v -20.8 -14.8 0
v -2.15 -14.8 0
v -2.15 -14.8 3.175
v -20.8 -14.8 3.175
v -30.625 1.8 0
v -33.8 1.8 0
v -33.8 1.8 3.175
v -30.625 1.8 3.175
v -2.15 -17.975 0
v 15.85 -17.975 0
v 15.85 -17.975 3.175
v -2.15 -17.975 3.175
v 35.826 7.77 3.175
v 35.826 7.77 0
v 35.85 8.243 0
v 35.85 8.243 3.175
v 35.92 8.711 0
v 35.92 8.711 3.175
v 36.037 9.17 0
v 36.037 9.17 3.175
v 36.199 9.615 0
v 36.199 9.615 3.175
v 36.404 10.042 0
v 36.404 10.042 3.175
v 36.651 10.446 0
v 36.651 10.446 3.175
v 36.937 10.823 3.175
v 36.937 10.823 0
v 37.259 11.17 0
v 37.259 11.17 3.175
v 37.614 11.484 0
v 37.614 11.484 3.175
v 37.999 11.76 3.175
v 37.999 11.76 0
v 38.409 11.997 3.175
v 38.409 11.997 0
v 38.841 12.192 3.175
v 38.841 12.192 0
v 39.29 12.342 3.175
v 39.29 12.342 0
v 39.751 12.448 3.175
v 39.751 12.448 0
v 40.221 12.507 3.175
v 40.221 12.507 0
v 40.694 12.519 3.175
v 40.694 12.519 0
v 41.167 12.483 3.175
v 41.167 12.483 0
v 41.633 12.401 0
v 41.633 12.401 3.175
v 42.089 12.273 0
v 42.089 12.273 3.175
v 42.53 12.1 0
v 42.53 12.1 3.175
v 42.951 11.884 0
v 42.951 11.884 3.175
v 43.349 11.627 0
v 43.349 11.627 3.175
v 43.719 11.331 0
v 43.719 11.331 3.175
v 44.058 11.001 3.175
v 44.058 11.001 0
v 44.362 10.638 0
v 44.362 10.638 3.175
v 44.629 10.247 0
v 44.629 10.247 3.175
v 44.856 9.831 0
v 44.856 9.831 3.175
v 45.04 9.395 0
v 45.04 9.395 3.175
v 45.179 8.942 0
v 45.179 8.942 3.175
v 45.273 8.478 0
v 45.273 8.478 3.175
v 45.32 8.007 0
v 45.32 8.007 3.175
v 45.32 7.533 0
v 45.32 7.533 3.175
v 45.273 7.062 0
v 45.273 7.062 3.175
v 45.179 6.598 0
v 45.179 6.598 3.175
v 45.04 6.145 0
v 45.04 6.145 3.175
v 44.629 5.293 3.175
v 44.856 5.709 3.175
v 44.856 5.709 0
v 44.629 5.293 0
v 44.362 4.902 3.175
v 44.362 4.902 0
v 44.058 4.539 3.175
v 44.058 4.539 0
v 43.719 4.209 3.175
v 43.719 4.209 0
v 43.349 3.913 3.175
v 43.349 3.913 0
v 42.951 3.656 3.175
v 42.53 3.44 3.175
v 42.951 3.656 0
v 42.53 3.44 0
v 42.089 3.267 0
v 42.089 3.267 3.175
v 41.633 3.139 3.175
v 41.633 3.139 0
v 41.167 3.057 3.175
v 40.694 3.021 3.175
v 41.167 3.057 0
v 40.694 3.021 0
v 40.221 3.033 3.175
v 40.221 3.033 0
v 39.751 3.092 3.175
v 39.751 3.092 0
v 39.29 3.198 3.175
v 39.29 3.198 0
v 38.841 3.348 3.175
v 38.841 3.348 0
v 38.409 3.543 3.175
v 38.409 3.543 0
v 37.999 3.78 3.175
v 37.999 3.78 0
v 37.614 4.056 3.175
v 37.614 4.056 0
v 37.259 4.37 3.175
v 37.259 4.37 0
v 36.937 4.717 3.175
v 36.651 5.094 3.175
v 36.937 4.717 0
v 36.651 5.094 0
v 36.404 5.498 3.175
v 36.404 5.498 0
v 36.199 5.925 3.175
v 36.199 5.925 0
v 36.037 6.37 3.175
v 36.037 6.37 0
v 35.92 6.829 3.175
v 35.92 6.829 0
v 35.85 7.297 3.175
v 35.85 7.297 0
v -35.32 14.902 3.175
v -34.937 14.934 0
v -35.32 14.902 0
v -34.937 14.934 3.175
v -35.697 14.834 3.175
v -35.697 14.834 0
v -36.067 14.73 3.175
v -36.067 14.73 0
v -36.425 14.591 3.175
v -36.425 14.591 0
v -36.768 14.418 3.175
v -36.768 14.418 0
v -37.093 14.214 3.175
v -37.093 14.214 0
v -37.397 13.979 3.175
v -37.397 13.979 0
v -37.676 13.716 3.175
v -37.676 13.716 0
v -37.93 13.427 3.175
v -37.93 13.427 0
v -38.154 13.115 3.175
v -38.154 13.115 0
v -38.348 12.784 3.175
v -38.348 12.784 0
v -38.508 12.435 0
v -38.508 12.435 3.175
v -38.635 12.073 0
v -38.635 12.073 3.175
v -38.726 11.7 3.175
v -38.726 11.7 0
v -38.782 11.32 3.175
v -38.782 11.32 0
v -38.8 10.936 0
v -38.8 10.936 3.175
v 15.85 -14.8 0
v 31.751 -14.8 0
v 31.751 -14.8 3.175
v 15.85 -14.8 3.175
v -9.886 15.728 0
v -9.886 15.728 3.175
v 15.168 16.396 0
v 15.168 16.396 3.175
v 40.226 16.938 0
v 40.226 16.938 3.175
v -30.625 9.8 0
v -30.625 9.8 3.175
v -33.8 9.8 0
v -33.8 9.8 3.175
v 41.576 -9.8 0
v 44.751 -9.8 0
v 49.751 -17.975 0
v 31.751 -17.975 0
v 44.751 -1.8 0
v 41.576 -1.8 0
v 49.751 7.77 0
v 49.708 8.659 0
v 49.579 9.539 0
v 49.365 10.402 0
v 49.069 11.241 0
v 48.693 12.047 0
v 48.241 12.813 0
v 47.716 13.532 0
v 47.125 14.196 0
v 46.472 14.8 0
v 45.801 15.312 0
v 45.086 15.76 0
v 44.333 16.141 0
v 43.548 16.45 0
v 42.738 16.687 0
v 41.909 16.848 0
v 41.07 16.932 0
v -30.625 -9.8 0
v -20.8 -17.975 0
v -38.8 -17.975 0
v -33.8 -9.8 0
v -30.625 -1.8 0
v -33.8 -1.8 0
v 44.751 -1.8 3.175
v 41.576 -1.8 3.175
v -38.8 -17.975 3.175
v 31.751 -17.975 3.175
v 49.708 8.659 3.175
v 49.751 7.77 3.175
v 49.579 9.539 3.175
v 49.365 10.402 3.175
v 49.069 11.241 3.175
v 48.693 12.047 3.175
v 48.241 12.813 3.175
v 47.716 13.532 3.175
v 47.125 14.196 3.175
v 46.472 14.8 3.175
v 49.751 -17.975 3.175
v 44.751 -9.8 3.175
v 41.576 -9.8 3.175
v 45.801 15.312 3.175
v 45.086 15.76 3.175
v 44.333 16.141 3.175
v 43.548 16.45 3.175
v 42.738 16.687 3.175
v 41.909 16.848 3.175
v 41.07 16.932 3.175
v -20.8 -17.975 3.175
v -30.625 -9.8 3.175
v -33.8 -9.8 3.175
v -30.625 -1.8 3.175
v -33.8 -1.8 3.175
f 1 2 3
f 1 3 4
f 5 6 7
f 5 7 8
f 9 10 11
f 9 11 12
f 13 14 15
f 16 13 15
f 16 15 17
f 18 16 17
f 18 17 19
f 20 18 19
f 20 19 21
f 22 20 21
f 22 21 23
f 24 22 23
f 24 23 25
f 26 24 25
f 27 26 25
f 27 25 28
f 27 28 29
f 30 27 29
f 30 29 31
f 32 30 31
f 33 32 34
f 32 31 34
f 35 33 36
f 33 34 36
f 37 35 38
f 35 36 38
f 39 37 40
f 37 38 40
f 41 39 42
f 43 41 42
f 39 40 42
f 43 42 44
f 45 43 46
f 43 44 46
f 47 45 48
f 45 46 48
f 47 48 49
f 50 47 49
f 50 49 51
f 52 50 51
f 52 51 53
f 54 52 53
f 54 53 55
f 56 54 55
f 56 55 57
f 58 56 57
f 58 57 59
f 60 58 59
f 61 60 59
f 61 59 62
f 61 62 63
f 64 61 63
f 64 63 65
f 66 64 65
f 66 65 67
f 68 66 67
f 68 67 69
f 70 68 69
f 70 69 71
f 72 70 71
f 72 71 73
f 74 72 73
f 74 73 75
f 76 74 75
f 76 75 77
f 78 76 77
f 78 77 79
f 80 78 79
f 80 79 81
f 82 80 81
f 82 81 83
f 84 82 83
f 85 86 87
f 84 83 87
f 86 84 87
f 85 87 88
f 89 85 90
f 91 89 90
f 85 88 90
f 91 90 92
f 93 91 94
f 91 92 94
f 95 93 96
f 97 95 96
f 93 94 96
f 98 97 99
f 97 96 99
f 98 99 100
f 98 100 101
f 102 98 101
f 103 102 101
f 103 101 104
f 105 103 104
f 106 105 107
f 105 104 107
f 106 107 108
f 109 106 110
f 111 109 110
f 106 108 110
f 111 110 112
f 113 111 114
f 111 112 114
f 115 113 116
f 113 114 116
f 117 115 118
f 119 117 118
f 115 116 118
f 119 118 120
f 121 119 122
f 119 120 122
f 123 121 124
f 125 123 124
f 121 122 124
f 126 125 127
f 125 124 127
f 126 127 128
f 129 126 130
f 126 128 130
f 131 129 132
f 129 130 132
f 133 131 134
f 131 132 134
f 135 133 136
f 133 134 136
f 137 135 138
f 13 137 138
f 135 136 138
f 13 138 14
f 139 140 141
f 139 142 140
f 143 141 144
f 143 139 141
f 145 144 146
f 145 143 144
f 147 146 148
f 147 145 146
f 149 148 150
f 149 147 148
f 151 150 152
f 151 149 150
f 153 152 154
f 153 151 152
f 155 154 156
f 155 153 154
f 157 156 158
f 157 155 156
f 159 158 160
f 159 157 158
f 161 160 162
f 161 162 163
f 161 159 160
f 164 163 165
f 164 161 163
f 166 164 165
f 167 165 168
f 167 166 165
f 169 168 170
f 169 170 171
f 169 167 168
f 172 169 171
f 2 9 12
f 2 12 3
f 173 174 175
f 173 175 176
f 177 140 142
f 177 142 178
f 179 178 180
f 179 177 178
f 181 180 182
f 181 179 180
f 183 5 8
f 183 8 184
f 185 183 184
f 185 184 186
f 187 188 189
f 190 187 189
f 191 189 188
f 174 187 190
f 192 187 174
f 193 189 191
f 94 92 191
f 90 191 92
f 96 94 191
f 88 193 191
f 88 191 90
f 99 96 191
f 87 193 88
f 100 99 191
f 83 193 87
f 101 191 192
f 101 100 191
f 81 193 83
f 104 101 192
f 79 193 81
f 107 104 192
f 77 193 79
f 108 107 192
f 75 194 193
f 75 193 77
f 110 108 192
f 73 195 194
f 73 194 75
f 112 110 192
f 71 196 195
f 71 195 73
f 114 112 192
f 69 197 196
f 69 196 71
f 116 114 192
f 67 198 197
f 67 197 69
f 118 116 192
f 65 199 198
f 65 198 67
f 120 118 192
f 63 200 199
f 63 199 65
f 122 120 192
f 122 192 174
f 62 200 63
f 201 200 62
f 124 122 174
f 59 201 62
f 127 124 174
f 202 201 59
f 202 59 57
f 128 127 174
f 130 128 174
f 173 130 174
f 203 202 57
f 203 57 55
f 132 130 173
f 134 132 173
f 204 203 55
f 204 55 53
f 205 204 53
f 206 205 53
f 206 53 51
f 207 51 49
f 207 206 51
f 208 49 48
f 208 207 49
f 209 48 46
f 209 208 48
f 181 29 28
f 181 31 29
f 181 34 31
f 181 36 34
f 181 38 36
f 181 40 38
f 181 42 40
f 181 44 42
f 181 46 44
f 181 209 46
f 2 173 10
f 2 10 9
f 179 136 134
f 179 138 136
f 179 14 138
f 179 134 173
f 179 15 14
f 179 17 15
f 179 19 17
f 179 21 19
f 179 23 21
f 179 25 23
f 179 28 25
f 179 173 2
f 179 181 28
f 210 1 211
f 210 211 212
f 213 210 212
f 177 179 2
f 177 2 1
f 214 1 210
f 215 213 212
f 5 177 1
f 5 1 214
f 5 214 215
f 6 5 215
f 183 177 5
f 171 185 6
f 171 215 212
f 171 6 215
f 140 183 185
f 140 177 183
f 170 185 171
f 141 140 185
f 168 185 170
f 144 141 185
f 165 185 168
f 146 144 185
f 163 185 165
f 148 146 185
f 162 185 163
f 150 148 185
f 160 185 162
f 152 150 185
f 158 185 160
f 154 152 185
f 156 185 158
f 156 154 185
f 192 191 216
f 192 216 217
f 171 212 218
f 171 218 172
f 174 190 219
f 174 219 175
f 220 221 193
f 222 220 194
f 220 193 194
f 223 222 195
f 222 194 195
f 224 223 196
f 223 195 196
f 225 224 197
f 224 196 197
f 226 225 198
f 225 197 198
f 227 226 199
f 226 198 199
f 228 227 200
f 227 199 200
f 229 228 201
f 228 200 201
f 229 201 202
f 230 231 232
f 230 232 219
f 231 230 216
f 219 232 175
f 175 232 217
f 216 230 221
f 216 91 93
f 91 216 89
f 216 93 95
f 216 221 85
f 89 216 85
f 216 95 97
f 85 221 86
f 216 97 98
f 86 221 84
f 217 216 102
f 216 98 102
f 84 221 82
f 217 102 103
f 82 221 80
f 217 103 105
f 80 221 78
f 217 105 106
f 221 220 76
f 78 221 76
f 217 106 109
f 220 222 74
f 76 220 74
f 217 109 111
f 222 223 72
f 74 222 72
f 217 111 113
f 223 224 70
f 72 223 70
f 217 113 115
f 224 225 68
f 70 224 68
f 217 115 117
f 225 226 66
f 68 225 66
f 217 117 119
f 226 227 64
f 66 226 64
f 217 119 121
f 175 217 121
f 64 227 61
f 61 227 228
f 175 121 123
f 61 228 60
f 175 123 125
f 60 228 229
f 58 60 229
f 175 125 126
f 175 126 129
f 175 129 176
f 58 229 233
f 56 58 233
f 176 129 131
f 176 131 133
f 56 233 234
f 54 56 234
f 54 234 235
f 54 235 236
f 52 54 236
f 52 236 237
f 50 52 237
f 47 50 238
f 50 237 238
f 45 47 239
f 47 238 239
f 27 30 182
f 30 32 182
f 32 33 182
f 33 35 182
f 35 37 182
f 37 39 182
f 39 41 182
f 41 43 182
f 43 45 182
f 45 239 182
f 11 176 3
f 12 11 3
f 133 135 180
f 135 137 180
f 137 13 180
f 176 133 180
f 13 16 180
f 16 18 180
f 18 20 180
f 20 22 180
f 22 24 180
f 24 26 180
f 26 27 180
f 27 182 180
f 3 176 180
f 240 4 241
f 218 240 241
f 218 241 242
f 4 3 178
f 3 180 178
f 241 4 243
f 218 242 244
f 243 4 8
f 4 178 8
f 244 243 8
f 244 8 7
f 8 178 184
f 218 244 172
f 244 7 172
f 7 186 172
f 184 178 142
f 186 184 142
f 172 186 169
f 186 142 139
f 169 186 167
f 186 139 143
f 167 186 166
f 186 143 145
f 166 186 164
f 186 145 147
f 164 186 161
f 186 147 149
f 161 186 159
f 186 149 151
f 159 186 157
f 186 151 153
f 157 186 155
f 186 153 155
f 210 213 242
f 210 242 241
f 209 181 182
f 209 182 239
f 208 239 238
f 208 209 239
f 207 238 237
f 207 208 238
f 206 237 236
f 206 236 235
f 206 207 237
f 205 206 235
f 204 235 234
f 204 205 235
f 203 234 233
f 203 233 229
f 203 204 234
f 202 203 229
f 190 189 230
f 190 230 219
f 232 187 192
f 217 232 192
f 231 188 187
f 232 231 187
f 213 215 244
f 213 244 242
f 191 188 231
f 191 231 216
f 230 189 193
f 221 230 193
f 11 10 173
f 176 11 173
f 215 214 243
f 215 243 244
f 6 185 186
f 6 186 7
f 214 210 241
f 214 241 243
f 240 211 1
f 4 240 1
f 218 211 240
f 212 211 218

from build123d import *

# Parameters (mm, degrees)
SKETCH1_W            = 6.266
SKETCH1_H            = 19.6
SKETCH1_R            = 1.675
SKETCH1_W_2          = 52.832
SKETCH1_H_2          = 5
BOSS_EXTRUDE2_DEPTH  = 3.175
SKETCH3_W            = 30
SKETCH3_H            = 29.6
BOSS_EXTRUDE3_DEPTH  = 3.175
SKETCH4_R            = 4.75
CUT_EXTRUDE1_DEPTH   = 10
BOSS_EXTRUDE14_DEPTH = 3.175
CUT_EXTRUDE8_DEPTH   = 10
BOSS_EXTRUDE15_DEPTH = 3.175
BOSS_EXTRUDE16_DEPTH = 3.175
BOSS_EXTRUDE17_DEPTH = 3.175
FILLET5_R            = 4
SKETCH27_W           = 3.175
SKETCH27_H           = 8
CUT_EXTRUDE9_DEPTH   = 10
SKETCH28_W           = 18
SKETCH28_H           = 3.175
BOSS_EXTRUDE18_DEPTH = 3.175
SKETCH29_W           = 53.813797415
SKETCH29_H           = 23.475817665
BOSS_EXTRUDE19_DEPTH = 3.175


with BuildPart() as part:
    # Sketch1 → Boss-Extrude2 (new body)
    # profile 1 of 4: a face of its own
    with BuildSketch(Plane.XY):
        with Locations((-23.283, 0)):
            Rectangle(SKETCH1_W, SKETCH1_H)
        with Locations((-23.95, -4.974)):
            Circle(SKETCH1_R, mode=Mode.SUBTRACT)
        with Locations((-23.95, 4.974)):
            Circle(SKETCH1_R, mode=Mode.SUBTRACT)
    # profile 2 of 4: a face of its own
    with BuildSketch(Plane.XY):
        with Locations((23.283, 0)):
            Rectangle(SKETCH1_W, SKETCH1_H)
        with Locations((23.95, -4.974)):
            Circle(SKETCH1_R, mode=Mode.SUBTRACT)
        with Locations((23.95, 4.974)):
            Circle(SKETCH1_R, mode=Mode.SUBTRACT)
    # profile 3 of 4: a face of its own
    with BuildSketch(Plane.XY):
        with Locations((0, 12.3)):
            Rectangle(SKETCH1_W_2, SKETCH1_H_2)
    # profile 4 of 4: a face of its own
    with BuildSketch(Plane.XY):
        with Locations((0, -12.3)):
            Rectangle(SKETCH1_W_2, SKETCH1_H_2)
    extrude(amount=BOSS_EXTRUDE2_DEPTH)

    # Sketch3 → Boss-Extrude3 (add)
    with BuildSketch(Plane.XY.offset(3.175)):
        with Locations((41.416, 0)):
            Rectangle(SKETCH3_W, SKETCH3_H)
    extrude(amount=-BOSS_EXTRUDE3_DEPTH)

    # Sketch4 → Cut-Extrude1 (cut)
    with BuildSketch(Plane(origin=(0, 0, 0), x_dir=(-1, 0, 0), z_dir=(0, 0, -1))):
        with Locations((-40.576, 7.77)):
            Circle(SKETCH4_R)
    extrude(amount=-CUT_EXTRUDE1_DEPTH, mode=Mode.SUBTRACT)

    # Sketch22 → Boss-Extrude14 (add)
    with BuildSketch(Plane(origin=(0, 0, 0), x_dir=(-1, 0, 0), z_dir=(0, 0, -1))):
        with BuildLine():
            ThreePointArc((-34.680262133, 14.8), (-40.576, 16.945), (-46.471737867, 14.8))
            Line((-46.471737867, 14.8), (-34.680262133, 14.8))
        make_face()
    extrude(amount=-BOSS_EXTRUDE14_DEPTH)

    # Sketch23 → Cut-Extrude8 (cut)
    with BuildSketch(Plane(origin=(0, 0, 0), x_dir=(-1, 0, 0), z_dir=(0, 0, -1))):
        with BuildLine():
            Line((-49.751, -14.8), (-49.751, 7.77))
            ThreePointArc((-49.751, 7.77), (-48.890866804, 11.648609936), (-46.471737867, 14.8))
            Line((-46.471737867, 14.8), (-56.416, 14.8))
            Line((-56.416, 14.8), (-56.416, -14.8))
            Line((-56.416, -14.8), (-49.751, -14.8))
        make_face()
    extrude(amount=-CUT_EXTRUDE8_DEPTH, mode=Mode.SUBTRACT)

    # Sketch24 → Boss-Extrude15 (add)
    with BuildSketch(Plane(origin=(0, 0, 0), x_dir=(-1, 0, 0), z_dir=(0, 0, -1))):
        Polygon((30.625, 14.8), (26.416, 14.8), (26.416, -14.8), (27.751006616, -14.8), (30.625, -14.8), align=None)
    extrude(amount=-BOSS_EXTRUDE15_DEPTH)

    # Sketch25 → Boss-Extrude16 (add)
    with BuildSketch(Plane(origin=(0, 0, 0), x_dir=(-1, 0, 0), z_dir=(0, 0, -1))):
        Polygon((30.625, 14.8), (30.625, 9.8), (33.8, 9.8), (33.8, 1.8), (30.625, 1.8), (30.625, -1.8), (33.8, -1.8), (33.8, -9.8), (30.625, -9.8), (30.625, -14.8), (31.879074074, -14.8), (38.8, -14.8), (38.8, 14.8), align=None)
    extrude(amount=-BOSS_EXTRUDE16_DEPTH)

    # Sketch26 → Boss-Extrude17 (add)
    with BuildSketch(Plane(origin=(0, 0, 0), x_dir=(-1, 0, 0), z_dir=(0, 0, -1))):
        with BuildLine():
            ThreePointArc((-40.225848077, 16.938316019), (-37.275108655, 16.330650754), (-34.680262133, 14.8))
            Line((-34.680262133, 14.8), (38.8, 14.8))
            ThreePointArc((38.8, 14.8), (-0.708684686, 16.025831975), (-40.225848077, 16.938316019))
        make_face()
    extrude(amount=-BOSS_EXTRUDE17_DEPTH)

    # Fillet5
    fillet5_edges = [part.edges().sort_by_distance(p)[0] for p in [
        (-38.8, 14.8, 1.5875),
    ]]
    fillet(fillet5_edges, radius=FILLET5_R)

    # Sketch27 → Cut-Extrude9 (cut)
    with BuildSketch(Plane(origin=(0, 0, 0), x_dir=(-1, 0, 0), z_dir=(0, 0, -1))):
        with Locations((-43.1635, -5.8)):
            Rectangle(SKETCH27_W, SKETCH27_H)
    extrude(amount=-CUT_EXTRUDE9_DEPTH, mode=Mode.SUBTRACT)

    # Sketch28 → Boss-Extrude18 (add)
    with BuildSketch(Plane(origin=(0, 0, 0), x_dir=(-1, 0, 0), z_dir=(0, 0, -1))):
        with Locations((-40.751, -16.3875)):
            Rectangle(SKETCH28_W, SKETCH28_H)
        with Locations((-6.85, -16.3875)):
            Rectangle(SKETCH28_W, SKETCH28_H)
        with Locations((29.8, -16.3875)):
            Rectangle(SKETCH28_W, SKETCH28_H)
    extrude(amount=-BOSS_EXTRUDE18_DEPTH)

    # Sketch29 → Boss-Extrude19 (add)
    with BuildSketch(Plane(origin=(0, 0, 0), x_dir=(-1, 0, 0), z_dir=(0, 0, -1))):
        with Locations((0.393454416, 0.74908249)):
            Rectangle(SKETCH29_W, SKETCH29_H)
    extrude(amount=-BOSS_EXTRUDE19_DEPTH)


solid = part.part
